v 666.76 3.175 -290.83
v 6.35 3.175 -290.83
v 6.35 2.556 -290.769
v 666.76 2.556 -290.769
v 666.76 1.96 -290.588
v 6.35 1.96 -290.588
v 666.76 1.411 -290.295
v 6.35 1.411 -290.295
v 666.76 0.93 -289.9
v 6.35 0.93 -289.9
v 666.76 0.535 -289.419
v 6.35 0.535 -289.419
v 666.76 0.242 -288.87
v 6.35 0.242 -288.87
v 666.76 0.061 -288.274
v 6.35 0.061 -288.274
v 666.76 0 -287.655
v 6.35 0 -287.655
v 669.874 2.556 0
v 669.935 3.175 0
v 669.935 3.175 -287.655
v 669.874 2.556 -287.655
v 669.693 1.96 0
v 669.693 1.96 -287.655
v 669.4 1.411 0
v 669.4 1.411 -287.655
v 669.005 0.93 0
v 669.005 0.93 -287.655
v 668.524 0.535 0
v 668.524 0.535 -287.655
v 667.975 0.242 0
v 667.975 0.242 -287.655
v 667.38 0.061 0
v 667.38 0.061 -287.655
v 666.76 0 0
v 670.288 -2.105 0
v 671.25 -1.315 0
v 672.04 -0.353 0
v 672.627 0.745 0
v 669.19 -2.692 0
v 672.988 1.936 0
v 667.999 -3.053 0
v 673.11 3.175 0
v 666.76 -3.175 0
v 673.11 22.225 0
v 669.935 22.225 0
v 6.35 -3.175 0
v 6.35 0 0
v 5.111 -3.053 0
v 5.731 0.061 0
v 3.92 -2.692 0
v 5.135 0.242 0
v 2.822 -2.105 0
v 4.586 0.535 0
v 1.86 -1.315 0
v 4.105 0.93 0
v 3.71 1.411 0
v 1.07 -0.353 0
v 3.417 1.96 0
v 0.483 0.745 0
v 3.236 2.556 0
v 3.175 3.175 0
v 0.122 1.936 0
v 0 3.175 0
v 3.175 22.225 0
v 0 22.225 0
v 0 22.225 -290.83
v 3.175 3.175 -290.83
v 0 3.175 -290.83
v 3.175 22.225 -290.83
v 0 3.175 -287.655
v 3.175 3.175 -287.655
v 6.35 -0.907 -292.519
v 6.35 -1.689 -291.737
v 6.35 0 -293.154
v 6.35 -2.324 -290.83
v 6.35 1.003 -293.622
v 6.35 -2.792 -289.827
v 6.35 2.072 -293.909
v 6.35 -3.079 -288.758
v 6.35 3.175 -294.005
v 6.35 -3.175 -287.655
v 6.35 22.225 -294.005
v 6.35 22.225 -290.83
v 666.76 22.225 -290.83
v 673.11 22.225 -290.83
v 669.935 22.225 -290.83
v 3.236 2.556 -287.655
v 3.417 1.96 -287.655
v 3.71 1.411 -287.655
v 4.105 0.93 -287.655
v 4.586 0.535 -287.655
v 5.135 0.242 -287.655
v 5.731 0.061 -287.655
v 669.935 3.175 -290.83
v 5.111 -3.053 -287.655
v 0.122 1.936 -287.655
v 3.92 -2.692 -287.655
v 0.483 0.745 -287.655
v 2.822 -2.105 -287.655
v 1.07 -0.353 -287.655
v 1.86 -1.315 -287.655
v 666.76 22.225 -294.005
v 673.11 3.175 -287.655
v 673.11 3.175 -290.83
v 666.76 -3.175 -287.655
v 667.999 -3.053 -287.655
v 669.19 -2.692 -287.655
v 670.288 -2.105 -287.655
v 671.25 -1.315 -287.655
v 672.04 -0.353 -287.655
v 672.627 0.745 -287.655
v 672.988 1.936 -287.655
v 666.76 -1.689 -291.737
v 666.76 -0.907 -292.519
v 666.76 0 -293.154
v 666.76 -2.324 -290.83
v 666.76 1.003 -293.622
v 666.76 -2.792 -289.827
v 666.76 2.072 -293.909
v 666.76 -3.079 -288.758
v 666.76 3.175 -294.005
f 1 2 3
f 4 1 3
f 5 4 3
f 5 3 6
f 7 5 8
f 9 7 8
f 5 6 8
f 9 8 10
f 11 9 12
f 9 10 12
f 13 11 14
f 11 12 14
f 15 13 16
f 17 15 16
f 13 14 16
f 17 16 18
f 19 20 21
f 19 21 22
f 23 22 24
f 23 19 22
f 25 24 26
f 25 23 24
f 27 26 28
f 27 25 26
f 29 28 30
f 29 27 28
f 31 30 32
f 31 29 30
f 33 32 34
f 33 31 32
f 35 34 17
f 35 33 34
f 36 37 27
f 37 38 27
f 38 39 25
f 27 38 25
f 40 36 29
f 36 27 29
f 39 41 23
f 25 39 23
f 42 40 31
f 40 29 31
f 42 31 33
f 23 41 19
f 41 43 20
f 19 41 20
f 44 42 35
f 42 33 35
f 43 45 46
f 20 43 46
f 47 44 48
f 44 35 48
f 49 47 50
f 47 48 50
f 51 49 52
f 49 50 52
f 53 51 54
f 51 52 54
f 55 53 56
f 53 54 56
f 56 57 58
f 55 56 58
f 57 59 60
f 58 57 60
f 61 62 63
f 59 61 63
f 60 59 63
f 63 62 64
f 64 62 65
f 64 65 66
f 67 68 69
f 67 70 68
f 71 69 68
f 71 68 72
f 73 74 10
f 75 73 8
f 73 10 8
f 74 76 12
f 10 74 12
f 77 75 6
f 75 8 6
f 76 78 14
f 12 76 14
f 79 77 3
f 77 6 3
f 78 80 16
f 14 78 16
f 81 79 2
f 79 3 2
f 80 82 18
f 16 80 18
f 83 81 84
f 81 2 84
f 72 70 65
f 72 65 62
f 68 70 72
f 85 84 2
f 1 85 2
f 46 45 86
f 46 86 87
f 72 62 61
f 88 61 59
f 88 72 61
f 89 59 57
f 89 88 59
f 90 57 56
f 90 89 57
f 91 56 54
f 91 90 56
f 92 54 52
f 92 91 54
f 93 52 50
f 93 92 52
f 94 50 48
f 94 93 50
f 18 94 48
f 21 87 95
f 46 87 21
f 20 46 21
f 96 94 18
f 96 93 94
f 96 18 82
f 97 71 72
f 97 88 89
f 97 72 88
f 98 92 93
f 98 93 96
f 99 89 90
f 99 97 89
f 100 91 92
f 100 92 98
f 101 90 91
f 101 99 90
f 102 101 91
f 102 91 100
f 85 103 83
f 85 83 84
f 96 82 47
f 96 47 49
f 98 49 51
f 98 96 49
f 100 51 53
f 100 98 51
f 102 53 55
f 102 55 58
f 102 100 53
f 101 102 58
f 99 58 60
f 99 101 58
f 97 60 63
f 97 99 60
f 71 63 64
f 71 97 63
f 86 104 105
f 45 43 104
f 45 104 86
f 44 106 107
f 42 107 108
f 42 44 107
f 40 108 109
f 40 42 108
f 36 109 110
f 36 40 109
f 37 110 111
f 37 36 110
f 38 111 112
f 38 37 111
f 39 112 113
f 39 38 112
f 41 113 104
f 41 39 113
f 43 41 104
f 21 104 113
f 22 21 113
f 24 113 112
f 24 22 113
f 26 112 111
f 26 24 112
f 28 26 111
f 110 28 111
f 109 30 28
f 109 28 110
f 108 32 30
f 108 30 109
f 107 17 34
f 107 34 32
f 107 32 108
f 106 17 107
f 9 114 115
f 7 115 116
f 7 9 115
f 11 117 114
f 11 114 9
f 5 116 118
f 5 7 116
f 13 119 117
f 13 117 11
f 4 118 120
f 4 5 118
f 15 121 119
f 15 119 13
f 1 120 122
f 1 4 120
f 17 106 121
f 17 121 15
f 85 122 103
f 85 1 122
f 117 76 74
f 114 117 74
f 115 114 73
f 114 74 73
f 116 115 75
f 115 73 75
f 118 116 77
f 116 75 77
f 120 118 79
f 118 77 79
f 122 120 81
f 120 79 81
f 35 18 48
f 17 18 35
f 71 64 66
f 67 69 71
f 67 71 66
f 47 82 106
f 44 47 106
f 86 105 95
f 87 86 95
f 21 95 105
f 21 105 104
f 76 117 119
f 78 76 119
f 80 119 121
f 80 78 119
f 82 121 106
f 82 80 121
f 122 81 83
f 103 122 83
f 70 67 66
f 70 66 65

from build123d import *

# Parameters (mm, degrees)
SKETCH1_W                      = 673.11016
SKETCH1_H                      = 290.83
BASE_FLANGE1_DEPTH             = 3.175
EDGE_FLANGE2_STRIP_W           = 19.05
EDGE_FLANGE2_STRIP_H           = 3.175
EDGE_FLANGE2_STRIP_CUT_DEPTH   = 290.83
EDGE_FLANGE2_STRIP_2_W         = 19.05
EDGE_FLANGE2_STRIP_2_H         = 3.175
EDGE_FLANGE2_STRIP_CUT_2_DEPTH = 290.83
EDGE_FLANGE2_DEPTH             = 290.83
EDGE_FLANGE2_BEND_DEPTH        = 290.83
EDGE_FLANGE3_DEPTH             = 673.11016
EDGE_FLANGE3_2_DEPTH           = 6.35
EDGE_FLANGE3_START             = 666.76016
EDGE_FLANGE3_3_DEPTH           = 6.35
EDGE_FLANGE3_START_2           = 6.35
EDGE_FLANGE3_4_DEPTH           = 660.41016


# Read off the part's stored shape, not the designer's step: Edge-Flange3
# Sheet-metal steps are written as plain solids
with BuildPart() as part:
    # Sketch1 → Base-Flange1 (new body)
    with BuildSketch(Plane(origin=(0, 0, 0), x_dir=(1, 0, 0), z_dir=(0, 1, 0))):
        with Locations((336.55508, 145.415)):
            Rectangle(SKETCH1_W, SKETCH1_H)
    extrude(amount=-BASE_FLANGE1_DEPTH)

    # Edge-Flange2 strip (across the edge) → Edge-Flange2 strip cut (cut)
    with BuildSketch(Plane(origin=(673.11016, 0, 0), x_dir=(-1, 0, 0), z_dir=(0, 0, -1))):
        with Locations((-3.175, -1.5875)):
            Rectangle(EDGE_FLANGE2_STRIP_W, EDGE_FLANGE2_STRIP_H)
    extrude(amount=EDGE_FLANGE2_STRIP_CUT_DEPTH, mode=Mode.SUBTRACT)

    # Edge-Flange2 strip 2 (across the edge) → Edge-Flange2 strip cut 2 (cut)
    with BuildSketch(Plane.XY.offset(-290.83)):
        with Locations((-3.175, -1.5875)):
            Rectangle(EDGE_FLANGE2_STRIP_2_W, EDGE_FLANGE2_STRIP_2_H)
    extrude(amount=EDGE_FLANGE2_STRIP_CUT_2_DEPTH, mode=Mode.SUBTRACT)

    # Edge-Flange2 section (across the edge) → Edge-Flange2 (add)
    with BuildSketch(Plane(origin=(673.11016, 0, 0), x_dir=(-1, 0, 0), z_dir=(0, 0, -1))):
        with BuildLine():
            Line((0, 3.175), (0, 22.225))
            Line((0, 22.225), (3.175, 22.225))
            Line((3.175, 22.225), (3.175, 3.175))
            ThreePointArc((3.175, 3.175), (4.10493597, 0.92993597), (6.35, 0))
            Line((6.35, 0), (6.35, -3.175))
            ThreePointArc((6.35, -3.175), (1.859871939, -1.315128061), (0, 3.175))
        make_face()
    extrude(amount=EDGE_FLANGE2_DEPTH)

    # Edge-Flange2 section 2 (across the edge) → Edge-Flange2 bend (add)
    with BuildSketch(Plane.XY.offset(-290.83)):
        with BuildLine():
            Line((0, 3.175), (0, 22.225))
            Line((0, 22.225), (3.175, 22.225))
            Line((3.175, 22.225), (3.175, 3.175))
            ThreePointArc((3.175, 3.175), (4.10493597, 0.92993597), (6.35, 0))
            Line((6.35, 0), (6.35, -3.175))
            ThreePointArc((6.35, -3.175), (1.859871939, -1.315128061), (0, 3.175))
        make_face()
    extrude(amount=EDGE_FLANGE2_BEND_DEPTH)

    # Edge-Flange3 outline → Edge-Flange3 (cut)
    with BuildSketch(Plane.YZ):
        with BuildLine():
            Line((3.175, -290.83), (3.175, -287.655))
            Line((3.175, -287.655), (0, -287.655))
            ThreePointArc((0, -287.655), (0.92993597, -289.90006403), (3.175, -290.83))
        make_face()
        with BuildLine():
            ThreePointArc((-2.324261315, -290.83), (-2.958628997, -289.298500936), (-3.175, -287.655))
            Line((-3.175, -287.655), (-3.175, -290.83))
            Line((-3.175, -290.83), (-2.324261315, -290.83))
        make_face()
    extrude(amount=EDGE_FLANGE3_DEPTH, mode=Mode.SUBTRACT)

    # Edge-Flange3 2 outline → Edge-Flange3 2 (cut)
    with BuildSketch(Plane.YZ):
        with BuildLine():
            ThreePointArc((3.175, -290.83), (0.92993597, -289.90006403), (0, -287.655))
            Line((0, -287.655), (-3.175, -287.655))
            ThreePointArc((-3.175, -287.655), (-2.958628997, -289.298500936), (-2.324261315, -290.83))
            Line((-2.324261315, -290.83), (3.175, -290.83))
        make_face()
    extrude(amount=EDGE_FLANGE3_2_DEPTH, mode=Mode.SUBTRACT)

    # Edge-Flange3 3 outline → Edge-Flange3 3 (cut)
    with BuildSketch(Plane.YZ.offset(EDGE_FLANGE3_START)):
        with BuildLine():
            ThreePointArc((3.175, -290.83), (0.92993597, -289.90006403), (0, -287.655))
            Line((0, -287.655), (-3.175, -287.655))
            ThreePointArc((-3.175, -287.655), (-2.958628997, -289.298500936), (-2.324261315, -290.83))
            Line((-2.324261315, -290.83), (3.175, -290.83))
        make_face()
    extrude(amount=EDGE_FLANGE3_3_DEPTH, mode=Mode.SUBTRACT)

    # Edge-Flange3 4 outline → Edge-Flange3 4 (add)
    with BuildSketch(Plane.YZ.offset(EDGE_FLANGE3_START_2)):
        with BuildLine():
            Line((0, -287.655), (0, -290.83))
            Line((0, -290.83), (-2.324261315, -290.83))
            ThreePointArc((-2.324261315, -290.83), (-1e-09, -293.154261314), (3.175, -294.005))
            Line((3.175, -294.005), (22.225, -294.005))
            Line((22.225, -294.005), (22.225, -290.83))
            Line((22.225, -290.83), (3.175, -290.83))
            ThreePointArc((3.175, -290.83), (0.92993597, -289.90006403), (0, -287.655))
        make_face()
    extrude(amount=EDGE_FLANGE3_4_DEPTH)


solid = part.part
